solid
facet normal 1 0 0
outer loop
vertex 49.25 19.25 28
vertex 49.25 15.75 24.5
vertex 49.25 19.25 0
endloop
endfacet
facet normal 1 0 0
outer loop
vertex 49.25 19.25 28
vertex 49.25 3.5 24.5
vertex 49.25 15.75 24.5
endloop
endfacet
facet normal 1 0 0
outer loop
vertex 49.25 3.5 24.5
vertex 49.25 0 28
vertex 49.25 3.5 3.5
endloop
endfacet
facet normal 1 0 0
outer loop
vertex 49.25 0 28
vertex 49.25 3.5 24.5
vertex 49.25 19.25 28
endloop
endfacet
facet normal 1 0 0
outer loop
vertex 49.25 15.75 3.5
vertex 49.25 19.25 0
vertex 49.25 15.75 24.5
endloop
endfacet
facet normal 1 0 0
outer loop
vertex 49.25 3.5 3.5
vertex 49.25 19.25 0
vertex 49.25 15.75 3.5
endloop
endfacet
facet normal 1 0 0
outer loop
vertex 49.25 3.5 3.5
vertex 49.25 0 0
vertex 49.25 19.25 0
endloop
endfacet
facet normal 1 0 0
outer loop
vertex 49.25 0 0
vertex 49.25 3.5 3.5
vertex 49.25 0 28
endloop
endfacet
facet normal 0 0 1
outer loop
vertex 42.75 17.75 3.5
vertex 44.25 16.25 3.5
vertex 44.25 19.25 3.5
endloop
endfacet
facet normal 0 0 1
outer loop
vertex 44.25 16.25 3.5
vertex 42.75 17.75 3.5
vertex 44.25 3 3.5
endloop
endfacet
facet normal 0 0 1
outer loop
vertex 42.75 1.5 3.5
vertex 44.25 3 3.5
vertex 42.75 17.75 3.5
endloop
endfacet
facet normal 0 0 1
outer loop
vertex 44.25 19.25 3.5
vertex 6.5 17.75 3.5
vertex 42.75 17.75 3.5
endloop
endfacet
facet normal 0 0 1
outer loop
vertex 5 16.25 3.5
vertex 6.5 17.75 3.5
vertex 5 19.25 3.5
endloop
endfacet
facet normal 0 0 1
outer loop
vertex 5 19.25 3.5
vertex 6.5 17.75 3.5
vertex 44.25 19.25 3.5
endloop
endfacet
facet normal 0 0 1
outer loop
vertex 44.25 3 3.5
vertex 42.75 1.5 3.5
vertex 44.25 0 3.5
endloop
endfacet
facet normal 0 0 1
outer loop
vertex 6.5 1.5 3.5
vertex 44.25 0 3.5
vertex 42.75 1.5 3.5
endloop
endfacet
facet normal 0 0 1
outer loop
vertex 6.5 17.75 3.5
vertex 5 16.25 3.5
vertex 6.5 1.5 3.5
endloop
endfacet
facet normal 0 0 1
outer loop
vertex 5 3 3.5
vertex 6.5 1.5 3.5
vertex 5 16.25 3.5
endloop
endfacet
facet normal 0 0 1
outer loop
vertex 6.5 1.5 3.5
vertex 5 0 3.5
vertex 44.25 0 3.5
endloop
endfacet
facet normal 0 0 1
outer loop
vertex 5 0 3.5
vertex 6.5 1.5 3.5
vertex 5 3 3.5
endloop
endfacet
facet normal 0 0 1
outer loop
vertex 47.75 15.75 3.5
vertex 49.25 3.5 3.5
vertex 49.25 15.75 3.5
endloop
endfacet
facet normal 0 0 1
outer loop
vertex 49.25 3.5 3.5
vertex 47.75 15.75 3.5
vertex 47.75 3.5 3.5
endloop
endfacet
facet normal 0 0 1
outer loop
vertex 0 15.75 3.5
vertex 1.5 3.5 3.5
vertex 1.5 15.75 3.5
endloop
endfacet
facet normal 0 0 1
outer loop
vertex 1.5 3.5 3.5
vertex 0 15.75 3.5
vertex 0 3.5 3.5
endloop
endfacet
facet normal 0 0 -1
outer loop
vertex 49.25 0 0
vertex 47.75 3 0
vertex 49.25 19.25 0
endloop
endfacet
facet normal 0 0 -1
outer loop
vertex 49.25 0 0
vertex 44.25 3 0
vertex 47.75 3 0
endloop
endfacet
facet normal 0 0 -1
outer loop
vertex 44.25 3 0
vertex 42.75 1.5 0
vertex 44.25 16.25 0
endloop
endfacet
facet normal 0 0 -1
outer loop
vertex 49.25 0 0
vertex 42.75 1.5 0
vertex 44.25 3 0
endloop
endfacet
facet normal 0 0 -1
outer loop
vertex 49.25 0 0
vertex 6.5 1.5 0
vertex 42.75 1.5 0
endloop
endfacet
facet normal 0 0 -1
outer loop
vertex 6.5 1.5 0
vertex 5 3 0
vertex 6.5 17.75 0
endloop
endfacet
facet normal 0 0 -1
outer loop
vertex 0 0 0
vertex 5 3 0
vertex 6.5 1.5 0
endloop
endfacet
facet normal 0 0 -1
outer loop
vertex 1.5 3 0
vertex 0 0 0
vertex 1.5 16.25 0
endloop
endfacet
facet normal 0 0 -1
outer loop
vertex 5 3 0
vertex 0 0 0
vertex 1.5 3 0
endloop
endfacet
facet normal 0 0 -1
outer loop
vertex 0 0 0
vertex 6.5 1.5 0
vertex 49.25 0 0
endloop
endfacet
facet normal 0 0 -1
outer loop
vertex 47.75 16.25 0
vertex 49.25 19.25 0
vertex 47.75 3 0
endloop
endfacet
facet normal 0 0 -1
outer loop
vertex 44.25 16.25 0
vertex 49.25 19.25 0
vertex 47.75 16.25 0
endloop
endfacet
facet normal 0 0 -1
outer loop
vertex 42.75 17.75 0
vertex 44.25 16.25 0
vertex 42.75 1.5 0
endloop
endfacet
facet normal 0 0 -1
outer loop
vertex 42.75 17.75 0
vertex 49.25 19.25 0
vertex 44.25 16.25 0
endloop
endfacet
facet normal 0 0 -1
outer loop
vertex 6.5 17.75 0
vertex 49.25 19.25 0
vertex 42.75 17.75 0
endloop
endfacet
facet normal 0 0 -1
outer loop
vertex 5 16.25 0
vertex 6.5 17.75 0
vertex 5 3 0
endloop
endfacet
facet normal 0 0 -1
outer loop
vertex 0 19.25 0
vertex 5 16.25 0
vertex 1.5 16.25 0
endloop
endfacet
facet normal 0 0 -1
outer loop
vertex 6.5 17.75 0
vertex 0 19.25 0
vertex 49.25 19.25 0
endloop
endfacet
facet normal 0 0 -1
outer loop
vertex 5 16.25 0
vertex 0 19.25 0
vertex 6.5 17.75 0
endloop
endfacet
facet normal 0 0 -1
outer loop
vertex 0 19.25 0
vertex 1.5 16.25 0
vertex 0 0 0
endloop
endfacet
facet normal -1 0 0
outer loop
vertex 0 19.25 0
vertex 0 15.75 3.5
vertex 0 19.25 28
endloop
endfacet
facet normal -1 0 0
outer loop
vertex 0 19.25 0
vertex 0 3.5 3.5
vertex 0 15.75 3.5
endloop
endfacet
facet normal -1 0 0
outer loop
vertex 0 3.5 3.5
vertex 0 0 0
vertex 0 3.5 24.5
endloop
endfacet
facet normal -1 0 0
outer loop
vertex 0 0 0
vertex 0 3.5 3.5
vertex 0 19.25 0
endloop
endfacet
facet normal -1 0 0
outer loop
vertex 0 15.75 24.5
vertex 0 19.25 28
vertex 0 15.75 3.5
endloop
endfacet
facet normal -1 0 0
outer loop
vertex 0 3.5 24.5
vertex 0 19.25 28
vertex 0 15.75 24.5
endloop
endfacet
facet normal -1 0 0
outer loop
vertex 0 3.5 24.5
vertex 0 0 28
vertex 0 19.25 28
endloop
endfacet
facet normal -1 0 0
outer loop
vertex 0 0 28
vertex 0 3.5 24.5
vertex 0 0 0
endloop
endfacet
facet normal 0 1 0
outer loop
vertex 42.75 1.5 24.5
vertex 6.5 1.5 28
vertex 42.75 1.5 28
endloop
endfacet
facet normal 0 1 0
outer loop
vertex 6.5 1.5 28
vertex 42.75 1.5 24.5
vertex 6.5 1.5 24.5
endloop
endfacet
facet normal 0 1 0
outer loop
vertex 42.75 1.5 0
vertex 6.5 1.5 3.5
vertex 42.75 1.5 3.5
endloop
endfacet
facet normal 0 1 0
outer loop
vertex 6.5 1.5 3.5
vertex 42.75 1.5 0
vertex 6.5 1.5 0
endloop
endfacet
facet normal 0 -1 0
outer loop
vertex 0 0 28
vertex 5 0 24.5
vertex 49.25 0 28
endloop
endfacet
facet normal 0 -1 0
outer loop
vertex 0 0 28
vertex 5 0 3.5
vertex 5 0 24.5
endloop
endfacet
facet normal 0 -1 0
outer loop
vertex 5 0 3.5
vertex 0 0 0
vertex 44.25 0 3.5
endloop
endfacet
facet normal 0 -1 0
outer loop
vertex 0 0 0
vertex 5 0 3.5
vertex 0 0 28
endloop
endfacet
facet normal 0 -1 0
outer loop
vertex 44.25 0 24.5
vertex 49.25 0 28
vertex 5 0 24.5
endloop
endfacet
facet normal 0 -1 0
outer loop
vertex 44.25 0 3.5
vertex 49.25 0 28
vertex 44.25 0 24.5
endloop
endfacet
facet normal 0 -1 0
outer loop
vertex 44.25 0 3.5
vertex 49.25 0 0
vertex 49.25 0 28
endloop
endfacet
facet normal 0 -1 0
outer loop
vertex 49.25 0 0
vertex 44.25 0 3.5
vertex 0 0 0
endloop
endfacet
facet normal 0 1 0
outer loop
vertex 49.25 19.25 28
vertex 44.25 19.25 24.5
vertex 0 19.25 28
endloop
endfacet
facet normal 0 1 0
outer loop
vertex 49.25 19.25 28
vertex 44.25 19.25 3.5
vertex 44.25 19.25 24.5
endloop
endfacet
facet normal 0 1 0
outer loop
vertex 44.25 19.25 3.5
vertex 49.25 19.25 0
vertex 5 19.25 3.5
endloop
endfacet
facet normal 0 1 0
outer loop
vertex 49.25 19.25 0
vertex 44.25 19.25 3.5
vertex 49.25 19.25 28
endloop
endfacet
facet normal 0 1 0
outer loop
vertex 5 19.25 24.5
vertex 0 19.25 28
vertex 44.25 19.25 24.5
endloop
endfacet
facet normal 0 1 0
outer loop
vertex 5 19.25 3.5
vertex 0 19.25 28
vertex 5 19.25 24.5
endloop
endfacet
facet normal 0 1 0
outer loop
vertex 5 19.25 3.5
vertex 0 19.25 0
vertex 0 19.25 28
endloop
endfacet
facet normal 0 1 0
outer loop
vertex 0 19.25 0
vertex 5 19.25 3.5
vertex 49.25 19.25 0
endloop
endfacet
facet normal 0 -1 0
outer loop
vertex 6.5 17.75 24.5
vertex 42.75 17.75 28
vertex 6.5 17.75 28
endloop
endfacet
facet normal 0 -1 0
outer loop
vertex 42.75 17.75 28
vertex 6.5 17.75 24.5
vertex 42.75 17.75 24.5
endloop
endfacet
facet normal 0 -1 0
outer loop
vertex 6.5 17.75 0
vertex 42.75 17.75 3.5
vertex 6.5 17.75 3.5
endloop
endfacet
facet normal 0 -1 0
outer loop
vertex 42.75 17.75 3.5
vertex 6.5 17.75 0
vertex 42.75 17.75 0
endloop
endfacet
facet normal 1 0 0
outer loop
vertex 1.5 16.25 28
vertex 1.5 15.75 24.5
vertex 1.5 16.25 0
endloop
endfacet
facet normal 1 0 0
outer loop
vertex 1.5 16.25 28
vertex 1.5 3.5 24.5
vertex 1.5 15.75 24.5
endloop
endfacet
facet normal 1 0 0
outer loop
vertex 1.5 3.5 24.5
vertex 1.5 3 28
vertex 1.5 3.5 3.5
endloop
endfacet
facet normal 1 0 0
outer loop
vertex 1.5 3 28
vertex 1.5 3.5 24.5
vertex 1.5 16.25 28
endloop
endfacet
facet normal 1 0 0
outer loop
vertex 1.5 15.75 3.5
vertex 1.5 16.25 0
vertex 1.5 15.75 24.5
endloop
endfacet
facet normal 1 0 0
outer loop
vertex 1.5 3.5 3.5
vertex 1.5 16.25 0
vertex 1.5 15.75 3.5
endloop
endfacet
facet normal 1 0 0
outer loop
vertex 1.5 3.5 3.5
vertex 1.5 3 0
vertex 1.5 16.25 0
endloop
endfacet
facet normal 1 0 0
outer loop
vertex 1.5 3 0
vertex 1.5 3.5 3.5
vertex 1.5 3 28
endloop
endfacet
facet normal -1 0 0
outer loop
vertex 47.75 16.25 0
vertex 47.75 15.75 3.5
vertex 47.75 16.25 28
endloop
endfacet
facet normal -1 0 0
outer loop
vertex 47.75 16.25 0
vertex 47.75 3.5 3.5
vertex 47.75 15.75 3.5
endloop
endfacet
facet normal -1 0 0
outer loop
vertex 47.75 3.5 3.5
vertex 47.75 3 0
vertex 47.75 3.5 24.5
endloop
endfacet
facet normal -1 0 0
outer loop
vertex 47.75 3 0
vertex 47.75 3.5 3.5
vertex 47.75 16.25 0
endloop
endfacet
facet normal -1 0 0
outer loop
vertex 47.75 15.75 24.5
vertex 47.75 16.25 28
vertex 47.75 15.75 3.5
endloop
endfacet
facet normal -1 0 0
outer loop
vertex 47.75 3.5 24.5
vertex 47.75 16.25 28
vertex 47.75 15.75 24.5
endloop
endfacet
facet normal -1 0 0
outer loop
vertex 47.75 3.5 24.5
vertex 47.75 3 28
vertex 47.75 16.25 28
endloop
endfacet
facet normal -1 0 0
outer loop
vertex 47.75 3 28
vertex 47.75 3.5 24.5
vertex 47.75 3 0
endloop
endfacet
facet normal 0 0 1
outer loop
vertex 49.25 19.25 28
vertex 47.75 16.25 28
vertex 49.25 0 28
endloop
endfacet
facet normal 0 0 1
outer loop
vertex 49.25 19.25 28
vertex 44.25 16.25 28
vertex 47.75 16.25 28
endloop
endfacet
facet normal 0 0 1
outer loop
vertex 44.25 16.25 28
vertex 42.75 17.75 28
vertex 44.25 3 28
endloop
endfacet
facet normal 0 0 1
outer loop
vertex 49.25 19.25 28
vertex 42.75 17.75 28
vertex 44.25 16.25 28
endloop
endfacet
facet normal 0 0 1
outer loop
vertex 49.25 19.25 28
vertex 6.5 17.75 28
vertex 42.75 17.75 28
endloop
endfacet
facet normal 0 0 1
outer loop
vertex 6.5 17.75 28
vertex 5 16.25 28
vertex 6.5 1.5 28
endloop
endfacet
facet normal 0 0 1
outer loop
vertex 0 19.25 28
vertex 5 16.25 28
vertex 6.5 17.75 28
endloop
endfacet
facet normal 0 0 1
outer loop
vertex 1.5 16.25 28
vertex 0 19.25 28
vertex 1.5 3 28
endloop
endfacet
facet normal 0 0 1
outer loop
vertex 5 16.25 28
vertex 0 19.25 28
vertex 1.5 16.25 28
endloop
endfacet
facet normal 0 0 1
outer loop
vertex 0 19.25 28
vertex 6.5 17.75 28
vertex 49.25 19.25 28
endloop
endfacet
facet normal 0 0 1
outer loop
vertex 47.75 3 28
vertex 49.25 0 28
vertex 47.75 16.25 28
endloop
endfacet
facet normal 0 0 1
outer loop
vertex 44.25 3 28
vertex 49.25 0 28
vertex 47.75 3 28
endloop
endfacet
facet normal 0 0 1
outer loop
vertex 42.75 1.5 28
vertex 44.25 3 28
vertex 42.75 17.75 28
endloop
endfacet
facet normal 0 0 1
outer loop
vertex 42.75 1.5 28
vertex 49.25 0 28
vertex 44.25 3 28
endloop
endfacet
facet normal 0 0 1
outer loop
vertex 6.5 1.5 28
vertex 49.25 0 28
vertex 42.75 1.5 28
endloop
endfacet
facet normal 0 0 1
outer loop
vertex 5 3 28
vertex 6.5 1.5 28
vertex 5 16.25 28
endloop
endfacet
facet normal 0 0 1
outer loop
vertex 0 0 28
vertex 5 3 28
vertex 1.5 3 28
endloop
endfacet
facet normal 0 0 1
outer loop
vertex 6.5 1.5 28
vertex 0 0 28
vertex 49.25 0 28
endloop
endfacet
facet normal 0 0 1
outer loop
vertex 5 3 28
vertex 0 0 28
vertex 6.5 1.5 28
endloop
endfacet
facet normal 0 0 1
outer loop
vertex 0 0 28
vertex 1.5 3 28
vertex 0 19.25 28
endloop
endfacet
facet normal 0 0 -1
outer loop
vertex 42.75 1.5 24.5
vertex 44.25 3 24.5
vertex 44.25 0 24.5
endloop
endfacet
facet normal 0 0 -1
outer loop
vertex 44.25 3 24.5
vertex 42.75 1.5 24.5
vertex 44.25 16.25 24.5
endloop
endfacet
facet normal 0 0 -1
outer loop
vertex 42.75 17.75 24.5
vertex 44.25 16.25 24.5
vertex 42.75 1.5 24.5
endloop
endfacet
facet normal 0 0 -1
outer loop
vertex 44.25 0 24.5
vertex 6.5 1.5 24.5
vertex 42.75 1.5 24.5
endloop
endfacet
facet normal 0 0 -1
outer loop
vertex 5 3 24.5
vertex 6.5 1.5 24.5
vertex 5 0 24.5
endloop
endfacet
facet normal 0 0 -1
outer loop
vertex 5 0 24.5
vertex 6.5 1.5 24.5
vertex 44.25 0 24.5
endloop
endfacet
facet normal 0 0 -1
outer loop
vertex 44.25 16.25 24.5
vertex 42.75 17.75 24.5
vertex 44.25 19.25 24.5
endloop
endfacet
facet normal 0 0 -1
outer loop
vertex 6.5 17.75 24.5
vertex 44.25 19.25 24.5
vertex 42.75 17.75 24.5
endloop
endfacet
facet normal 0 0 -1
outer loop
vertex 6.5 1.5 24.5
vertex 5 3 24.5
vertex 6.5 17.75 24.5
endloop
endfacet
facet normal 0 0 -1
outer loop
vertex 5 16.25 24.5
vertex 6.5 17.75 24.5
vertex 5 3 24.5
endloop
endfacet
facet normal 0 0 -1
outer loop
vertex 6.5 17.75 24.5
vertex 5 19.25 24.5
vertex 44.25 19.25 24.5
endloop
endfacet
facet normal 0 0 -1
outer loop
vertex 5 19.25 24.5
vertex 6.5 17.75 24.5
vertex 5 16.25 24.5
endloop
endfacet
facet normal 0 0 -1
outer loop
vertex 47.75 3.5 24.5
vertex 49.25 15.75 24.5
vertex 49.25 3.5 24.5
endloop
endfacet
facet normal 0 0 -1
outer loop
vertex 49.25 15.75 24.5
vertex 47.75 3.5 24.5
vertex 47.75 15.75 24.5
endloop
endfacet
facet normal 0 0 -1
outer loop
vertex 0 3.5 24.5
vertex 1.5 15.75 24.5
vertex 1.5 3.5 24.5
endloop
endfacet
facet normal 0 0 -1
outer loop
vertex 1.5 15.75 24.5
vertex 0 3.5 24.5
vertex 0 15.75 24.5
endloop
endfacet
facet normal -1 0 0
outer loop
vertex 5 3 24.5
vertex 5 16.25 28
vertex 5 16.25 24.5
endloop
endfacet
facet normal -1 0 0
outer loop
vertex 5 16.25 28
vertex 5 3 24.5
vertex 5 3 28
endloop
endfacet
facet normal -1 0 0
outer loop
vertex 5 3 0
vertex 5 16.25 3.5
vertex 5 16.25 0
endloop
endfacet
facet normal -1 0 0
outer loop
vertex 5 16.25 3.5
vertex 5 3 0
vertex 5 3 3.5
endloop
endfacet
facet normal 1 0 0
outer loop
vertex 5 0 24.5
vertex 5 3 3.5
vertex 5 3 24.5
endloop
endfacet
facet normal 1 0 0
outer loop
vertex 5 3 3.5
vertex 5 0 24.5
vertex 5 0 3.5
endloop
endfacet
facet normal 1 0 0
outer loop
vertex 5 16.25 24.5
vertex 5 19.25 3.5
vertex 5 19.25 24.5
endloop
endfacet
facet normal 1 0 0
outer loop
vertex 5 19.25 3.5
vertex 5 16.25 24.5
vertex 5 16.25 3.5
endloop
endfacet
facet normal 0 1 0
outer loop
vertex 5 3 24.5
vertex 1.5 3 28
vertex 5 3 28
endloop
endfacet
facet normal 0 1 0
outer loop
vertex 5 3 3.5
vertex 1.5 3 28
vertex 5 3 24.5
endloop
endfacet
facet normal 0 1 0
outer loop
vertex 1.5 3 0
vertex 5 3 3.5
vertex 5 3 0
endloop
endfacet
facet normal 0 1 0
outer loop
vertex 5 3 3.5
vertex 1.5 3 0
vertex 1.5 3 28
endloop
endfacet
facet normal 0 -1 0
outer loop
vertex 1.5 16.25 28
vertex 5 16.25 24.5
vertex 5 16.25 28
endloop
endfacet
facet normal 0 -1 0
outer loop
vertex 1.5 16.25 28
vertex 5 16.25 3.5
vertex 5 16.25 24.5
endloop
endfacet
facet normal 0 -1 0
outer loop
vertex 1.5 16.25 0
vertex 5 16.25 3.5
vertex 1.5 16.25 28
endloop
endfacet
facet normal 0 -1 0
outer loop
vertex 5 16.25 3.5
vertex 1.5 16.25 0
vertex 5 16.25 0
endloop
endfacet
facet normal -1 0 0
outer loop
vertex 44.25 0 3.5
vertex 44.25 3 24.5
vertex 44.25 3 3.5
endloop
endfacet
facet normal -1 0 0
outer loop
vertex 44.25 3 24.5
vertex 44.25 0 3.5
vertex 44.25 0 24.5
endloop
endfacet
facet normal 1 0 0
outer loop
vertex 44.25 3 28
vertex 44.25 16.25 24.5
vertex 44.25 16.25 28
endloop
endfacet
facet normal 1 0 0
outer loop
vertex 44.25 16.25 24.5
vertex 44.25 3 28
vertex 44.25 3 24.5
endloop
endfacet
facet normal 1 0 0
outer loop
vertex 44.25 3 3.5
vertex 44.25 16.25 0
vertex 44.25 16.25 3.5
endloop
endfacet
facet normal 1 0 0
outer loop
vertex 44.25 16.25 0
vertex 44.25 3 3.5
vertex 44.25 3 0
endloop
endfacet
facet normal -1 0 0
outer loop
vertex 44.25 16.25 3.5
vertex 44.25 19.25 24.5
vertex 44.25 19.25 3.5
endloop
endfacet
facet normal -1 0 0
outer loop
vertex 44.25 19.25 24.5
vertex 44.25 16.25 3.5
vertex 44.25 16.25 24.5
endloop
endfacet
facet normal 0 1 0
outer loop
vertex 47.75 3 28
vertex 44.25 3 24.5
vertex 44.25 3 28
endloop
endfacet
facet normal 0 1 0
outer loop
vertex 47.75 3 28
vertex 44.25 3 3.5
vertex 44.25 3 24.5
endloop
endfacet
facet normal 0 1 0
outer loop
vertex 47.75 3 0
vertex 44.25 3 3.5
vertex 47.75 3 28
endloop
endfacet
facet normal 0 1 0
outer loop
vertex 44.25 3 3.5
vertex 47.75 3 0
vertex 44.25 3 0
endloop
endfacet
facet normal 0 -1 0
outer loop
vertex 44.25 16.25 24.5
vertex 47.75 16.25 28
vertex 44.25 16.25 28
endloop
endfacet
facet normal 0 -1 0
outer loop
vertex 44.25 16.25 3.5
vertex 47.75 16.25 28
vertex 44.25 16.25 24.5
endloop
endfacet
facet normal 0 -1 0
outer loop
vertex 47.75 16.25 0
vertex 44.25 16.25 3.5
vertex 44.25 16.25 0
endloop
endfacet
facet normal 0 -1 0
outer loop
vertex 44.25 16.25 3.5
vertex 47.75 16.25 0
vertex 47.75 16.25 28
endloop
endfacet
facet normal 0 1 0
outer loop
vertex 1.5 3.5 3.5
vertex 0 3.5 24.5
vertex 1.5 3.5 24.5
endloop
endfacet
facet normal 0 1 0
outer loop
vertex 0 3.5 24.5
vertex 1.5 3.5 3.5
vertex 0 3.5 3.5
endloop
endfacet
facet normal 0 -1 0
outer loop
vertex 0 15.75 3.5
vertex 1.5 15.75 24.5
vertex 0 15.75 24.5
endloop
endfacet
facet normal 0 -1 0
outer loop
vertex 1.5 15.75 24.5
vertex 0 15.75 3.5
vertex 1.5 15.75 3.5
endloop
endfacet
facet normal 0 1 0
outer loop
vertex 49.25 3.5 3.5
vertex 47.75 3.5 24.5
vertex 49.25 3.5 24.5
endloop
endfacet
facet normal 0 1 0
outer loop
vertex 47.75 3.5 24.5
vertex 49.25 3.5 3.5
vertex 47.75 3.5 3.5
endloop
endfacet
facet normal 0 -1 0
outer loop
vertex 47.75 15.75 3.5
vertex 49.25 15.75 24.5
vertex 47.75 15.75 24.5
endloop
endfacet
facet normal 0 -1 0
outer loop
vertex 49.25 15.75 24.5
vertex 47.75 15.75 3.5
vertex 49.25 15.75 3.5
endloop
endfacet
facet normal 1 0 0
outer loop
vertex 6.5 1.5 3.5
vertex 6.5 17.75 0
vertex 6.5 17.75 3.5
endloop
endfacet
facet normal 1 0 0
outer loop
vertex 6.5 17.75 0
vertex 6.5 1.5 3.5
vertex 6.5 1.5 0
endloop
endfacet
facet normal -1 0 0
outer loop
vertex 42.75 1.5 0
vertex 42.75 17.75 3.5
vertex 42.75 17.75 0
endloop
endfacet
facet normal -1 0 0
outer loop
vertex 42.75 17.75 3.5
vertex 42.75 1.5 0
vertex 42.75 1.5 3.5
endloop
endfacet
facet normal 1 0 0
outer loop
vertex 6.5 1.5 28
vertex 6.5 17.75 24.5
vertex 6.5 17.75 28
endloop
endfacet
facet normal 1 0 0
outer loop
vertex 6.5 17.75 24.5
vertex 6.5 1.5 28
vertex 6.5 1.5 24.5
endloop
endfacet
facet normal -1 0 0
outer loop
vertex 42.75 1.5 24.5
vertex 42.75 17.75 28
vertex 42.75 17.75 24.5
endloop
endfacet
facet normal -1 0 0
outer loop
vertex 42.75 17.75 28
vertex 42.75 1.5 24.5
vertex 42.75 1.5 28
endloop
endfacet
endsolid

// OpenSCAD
//Units are in Inches
wood = [ 1.5, 3.5, 96 ]; //2x4 8 foot
aquarium = [48.25, 18.25, 19.75]; //75 gallon
stand = [aquarium.x + 1, aquarium.y + 1, 28];

middleSupports = false;
drawAquarium = false;

module base( move ) {
    wood_long = [ stand.x, wood.x, wood.y ];
    wood_short = [  wood.x, stand.y - (2*wood.x), wood.y ];

    translate( move ){
        color( "Sienna" ) cube( wood_long );
        translate( [0, stand.y - wood.x, 0]) color( "Sienna" ) cube(wood_long);
        translate( [ 0, wood.x, 0]) color( "green" ) cube( wood_short);
        translate( [ stand.x - wood.x, wood.x, 0]) color( "green" ) cube( wood_short);
        
        
        echo("Long Base", wood_long.x);
        echo("Long Base", wood_long.x);
        echo("Short Base", wood_short.y);
        echo("Short Base", wood_short.y);
    }
}

module uprights( move ){
    dimension = [wood.y, wood.x, stand.z];
    
    color( "yellow" ) 
    translate( move ) 
    cube( dimension );
    
    echo("Uprights", dimension.z);
}

module supports( move, rotate ){
    dimension = [wood.x, wood.y, stand.z - 2* wood.y ];
    
    color( rotate ? "hotpink" : "orangered" ) 
    translate( move )
    rotate( rotate )
    cube( dimension );
    
    echo("Support", dimension.z);
}

module crossBrace( move ){
    dimension = [ wood.x, stand.y - (2*wood.x), wood.y ];
    
    color( "lime")
    translate( move )
    cube( dimension );
    
    echo("Cross Brace", dimension.y);
}

base( [0,0,0] );
base( [0,0,stand.z - wood.y] );

uprights( [wood.x, wood.x, 0]);
uprights( [wood.x, stand.y - (2*wood.x) , 0]);
uprights( [stand.x - wood.x - wood.y, wood.x, 0] );
uprights( [stand.x - wood.x - wood.y, stand.y - (2*wood.x), 0] );

supports( [0, 0, wood.y] );
supports( [0, stand.y - wood.y, wood.y] );
supports( [stand.x - wood.x, 0, wood.y] );
supports( [stand.x - wood.x, stand.y - wood.y, wood.y] );
supports( [wood.x, wood.x, wood.y], [0,0,-90] );
supports( [wood.x, stand.y, wood.y], [0,0,-90] );
supports( [(stand.x - wood.y - wood.x), wood.x, wood.y], [0,0,-90] );
supports( [(stand.x - wood.y - wood.x), stand.y, wood.y], [0,0,-90] );

crossBrace([ wood.x + wood.y, wood.x, 0 ]);
crossBrace([ stand.x - (2*wood.x + wood.y), wood.x, 0 ]);
crossBrace([ wood.x + wood.y, wood.x, stand.z - wood.y ]);
crossBrace([ stand.x - (2*wood.x + wood.y), wood.x, stand.z - wood.y ]);

if( middleSupports ){
    middlePoint = (stand.x - wood.y)/2;
    
    uprights( [ middlePoint, wood.x, 0]);
    uprights( [ middlePoint, stand.y - (2*wood.x) , 0]);
    
    supports( [ middlePoint, wood.x, wood.y], [0,0,-90] );
    supports( [ middlePoint, stand.y, wood.y], [0,0,-90] );
    
    crossBrace([ middlePoint - wood.x, wood.x, 0 ]);
    crossBrace([ middlePoint + wood.y, wood.x, 0 ]);
    crossBrace([ middlePoint - wood.x, wood.x, stand.z - wood.y ]);
    crossBrace([ middlePoint + wood.y, wood.x, stand.z - wood.y ]);
}

if( drawAquarium ) translate( [(stand.x-aquarium.x)/2, (stand.y-aquarium.y)/2, stand.z] ) color("lightblue") cube(aquarium);
    
